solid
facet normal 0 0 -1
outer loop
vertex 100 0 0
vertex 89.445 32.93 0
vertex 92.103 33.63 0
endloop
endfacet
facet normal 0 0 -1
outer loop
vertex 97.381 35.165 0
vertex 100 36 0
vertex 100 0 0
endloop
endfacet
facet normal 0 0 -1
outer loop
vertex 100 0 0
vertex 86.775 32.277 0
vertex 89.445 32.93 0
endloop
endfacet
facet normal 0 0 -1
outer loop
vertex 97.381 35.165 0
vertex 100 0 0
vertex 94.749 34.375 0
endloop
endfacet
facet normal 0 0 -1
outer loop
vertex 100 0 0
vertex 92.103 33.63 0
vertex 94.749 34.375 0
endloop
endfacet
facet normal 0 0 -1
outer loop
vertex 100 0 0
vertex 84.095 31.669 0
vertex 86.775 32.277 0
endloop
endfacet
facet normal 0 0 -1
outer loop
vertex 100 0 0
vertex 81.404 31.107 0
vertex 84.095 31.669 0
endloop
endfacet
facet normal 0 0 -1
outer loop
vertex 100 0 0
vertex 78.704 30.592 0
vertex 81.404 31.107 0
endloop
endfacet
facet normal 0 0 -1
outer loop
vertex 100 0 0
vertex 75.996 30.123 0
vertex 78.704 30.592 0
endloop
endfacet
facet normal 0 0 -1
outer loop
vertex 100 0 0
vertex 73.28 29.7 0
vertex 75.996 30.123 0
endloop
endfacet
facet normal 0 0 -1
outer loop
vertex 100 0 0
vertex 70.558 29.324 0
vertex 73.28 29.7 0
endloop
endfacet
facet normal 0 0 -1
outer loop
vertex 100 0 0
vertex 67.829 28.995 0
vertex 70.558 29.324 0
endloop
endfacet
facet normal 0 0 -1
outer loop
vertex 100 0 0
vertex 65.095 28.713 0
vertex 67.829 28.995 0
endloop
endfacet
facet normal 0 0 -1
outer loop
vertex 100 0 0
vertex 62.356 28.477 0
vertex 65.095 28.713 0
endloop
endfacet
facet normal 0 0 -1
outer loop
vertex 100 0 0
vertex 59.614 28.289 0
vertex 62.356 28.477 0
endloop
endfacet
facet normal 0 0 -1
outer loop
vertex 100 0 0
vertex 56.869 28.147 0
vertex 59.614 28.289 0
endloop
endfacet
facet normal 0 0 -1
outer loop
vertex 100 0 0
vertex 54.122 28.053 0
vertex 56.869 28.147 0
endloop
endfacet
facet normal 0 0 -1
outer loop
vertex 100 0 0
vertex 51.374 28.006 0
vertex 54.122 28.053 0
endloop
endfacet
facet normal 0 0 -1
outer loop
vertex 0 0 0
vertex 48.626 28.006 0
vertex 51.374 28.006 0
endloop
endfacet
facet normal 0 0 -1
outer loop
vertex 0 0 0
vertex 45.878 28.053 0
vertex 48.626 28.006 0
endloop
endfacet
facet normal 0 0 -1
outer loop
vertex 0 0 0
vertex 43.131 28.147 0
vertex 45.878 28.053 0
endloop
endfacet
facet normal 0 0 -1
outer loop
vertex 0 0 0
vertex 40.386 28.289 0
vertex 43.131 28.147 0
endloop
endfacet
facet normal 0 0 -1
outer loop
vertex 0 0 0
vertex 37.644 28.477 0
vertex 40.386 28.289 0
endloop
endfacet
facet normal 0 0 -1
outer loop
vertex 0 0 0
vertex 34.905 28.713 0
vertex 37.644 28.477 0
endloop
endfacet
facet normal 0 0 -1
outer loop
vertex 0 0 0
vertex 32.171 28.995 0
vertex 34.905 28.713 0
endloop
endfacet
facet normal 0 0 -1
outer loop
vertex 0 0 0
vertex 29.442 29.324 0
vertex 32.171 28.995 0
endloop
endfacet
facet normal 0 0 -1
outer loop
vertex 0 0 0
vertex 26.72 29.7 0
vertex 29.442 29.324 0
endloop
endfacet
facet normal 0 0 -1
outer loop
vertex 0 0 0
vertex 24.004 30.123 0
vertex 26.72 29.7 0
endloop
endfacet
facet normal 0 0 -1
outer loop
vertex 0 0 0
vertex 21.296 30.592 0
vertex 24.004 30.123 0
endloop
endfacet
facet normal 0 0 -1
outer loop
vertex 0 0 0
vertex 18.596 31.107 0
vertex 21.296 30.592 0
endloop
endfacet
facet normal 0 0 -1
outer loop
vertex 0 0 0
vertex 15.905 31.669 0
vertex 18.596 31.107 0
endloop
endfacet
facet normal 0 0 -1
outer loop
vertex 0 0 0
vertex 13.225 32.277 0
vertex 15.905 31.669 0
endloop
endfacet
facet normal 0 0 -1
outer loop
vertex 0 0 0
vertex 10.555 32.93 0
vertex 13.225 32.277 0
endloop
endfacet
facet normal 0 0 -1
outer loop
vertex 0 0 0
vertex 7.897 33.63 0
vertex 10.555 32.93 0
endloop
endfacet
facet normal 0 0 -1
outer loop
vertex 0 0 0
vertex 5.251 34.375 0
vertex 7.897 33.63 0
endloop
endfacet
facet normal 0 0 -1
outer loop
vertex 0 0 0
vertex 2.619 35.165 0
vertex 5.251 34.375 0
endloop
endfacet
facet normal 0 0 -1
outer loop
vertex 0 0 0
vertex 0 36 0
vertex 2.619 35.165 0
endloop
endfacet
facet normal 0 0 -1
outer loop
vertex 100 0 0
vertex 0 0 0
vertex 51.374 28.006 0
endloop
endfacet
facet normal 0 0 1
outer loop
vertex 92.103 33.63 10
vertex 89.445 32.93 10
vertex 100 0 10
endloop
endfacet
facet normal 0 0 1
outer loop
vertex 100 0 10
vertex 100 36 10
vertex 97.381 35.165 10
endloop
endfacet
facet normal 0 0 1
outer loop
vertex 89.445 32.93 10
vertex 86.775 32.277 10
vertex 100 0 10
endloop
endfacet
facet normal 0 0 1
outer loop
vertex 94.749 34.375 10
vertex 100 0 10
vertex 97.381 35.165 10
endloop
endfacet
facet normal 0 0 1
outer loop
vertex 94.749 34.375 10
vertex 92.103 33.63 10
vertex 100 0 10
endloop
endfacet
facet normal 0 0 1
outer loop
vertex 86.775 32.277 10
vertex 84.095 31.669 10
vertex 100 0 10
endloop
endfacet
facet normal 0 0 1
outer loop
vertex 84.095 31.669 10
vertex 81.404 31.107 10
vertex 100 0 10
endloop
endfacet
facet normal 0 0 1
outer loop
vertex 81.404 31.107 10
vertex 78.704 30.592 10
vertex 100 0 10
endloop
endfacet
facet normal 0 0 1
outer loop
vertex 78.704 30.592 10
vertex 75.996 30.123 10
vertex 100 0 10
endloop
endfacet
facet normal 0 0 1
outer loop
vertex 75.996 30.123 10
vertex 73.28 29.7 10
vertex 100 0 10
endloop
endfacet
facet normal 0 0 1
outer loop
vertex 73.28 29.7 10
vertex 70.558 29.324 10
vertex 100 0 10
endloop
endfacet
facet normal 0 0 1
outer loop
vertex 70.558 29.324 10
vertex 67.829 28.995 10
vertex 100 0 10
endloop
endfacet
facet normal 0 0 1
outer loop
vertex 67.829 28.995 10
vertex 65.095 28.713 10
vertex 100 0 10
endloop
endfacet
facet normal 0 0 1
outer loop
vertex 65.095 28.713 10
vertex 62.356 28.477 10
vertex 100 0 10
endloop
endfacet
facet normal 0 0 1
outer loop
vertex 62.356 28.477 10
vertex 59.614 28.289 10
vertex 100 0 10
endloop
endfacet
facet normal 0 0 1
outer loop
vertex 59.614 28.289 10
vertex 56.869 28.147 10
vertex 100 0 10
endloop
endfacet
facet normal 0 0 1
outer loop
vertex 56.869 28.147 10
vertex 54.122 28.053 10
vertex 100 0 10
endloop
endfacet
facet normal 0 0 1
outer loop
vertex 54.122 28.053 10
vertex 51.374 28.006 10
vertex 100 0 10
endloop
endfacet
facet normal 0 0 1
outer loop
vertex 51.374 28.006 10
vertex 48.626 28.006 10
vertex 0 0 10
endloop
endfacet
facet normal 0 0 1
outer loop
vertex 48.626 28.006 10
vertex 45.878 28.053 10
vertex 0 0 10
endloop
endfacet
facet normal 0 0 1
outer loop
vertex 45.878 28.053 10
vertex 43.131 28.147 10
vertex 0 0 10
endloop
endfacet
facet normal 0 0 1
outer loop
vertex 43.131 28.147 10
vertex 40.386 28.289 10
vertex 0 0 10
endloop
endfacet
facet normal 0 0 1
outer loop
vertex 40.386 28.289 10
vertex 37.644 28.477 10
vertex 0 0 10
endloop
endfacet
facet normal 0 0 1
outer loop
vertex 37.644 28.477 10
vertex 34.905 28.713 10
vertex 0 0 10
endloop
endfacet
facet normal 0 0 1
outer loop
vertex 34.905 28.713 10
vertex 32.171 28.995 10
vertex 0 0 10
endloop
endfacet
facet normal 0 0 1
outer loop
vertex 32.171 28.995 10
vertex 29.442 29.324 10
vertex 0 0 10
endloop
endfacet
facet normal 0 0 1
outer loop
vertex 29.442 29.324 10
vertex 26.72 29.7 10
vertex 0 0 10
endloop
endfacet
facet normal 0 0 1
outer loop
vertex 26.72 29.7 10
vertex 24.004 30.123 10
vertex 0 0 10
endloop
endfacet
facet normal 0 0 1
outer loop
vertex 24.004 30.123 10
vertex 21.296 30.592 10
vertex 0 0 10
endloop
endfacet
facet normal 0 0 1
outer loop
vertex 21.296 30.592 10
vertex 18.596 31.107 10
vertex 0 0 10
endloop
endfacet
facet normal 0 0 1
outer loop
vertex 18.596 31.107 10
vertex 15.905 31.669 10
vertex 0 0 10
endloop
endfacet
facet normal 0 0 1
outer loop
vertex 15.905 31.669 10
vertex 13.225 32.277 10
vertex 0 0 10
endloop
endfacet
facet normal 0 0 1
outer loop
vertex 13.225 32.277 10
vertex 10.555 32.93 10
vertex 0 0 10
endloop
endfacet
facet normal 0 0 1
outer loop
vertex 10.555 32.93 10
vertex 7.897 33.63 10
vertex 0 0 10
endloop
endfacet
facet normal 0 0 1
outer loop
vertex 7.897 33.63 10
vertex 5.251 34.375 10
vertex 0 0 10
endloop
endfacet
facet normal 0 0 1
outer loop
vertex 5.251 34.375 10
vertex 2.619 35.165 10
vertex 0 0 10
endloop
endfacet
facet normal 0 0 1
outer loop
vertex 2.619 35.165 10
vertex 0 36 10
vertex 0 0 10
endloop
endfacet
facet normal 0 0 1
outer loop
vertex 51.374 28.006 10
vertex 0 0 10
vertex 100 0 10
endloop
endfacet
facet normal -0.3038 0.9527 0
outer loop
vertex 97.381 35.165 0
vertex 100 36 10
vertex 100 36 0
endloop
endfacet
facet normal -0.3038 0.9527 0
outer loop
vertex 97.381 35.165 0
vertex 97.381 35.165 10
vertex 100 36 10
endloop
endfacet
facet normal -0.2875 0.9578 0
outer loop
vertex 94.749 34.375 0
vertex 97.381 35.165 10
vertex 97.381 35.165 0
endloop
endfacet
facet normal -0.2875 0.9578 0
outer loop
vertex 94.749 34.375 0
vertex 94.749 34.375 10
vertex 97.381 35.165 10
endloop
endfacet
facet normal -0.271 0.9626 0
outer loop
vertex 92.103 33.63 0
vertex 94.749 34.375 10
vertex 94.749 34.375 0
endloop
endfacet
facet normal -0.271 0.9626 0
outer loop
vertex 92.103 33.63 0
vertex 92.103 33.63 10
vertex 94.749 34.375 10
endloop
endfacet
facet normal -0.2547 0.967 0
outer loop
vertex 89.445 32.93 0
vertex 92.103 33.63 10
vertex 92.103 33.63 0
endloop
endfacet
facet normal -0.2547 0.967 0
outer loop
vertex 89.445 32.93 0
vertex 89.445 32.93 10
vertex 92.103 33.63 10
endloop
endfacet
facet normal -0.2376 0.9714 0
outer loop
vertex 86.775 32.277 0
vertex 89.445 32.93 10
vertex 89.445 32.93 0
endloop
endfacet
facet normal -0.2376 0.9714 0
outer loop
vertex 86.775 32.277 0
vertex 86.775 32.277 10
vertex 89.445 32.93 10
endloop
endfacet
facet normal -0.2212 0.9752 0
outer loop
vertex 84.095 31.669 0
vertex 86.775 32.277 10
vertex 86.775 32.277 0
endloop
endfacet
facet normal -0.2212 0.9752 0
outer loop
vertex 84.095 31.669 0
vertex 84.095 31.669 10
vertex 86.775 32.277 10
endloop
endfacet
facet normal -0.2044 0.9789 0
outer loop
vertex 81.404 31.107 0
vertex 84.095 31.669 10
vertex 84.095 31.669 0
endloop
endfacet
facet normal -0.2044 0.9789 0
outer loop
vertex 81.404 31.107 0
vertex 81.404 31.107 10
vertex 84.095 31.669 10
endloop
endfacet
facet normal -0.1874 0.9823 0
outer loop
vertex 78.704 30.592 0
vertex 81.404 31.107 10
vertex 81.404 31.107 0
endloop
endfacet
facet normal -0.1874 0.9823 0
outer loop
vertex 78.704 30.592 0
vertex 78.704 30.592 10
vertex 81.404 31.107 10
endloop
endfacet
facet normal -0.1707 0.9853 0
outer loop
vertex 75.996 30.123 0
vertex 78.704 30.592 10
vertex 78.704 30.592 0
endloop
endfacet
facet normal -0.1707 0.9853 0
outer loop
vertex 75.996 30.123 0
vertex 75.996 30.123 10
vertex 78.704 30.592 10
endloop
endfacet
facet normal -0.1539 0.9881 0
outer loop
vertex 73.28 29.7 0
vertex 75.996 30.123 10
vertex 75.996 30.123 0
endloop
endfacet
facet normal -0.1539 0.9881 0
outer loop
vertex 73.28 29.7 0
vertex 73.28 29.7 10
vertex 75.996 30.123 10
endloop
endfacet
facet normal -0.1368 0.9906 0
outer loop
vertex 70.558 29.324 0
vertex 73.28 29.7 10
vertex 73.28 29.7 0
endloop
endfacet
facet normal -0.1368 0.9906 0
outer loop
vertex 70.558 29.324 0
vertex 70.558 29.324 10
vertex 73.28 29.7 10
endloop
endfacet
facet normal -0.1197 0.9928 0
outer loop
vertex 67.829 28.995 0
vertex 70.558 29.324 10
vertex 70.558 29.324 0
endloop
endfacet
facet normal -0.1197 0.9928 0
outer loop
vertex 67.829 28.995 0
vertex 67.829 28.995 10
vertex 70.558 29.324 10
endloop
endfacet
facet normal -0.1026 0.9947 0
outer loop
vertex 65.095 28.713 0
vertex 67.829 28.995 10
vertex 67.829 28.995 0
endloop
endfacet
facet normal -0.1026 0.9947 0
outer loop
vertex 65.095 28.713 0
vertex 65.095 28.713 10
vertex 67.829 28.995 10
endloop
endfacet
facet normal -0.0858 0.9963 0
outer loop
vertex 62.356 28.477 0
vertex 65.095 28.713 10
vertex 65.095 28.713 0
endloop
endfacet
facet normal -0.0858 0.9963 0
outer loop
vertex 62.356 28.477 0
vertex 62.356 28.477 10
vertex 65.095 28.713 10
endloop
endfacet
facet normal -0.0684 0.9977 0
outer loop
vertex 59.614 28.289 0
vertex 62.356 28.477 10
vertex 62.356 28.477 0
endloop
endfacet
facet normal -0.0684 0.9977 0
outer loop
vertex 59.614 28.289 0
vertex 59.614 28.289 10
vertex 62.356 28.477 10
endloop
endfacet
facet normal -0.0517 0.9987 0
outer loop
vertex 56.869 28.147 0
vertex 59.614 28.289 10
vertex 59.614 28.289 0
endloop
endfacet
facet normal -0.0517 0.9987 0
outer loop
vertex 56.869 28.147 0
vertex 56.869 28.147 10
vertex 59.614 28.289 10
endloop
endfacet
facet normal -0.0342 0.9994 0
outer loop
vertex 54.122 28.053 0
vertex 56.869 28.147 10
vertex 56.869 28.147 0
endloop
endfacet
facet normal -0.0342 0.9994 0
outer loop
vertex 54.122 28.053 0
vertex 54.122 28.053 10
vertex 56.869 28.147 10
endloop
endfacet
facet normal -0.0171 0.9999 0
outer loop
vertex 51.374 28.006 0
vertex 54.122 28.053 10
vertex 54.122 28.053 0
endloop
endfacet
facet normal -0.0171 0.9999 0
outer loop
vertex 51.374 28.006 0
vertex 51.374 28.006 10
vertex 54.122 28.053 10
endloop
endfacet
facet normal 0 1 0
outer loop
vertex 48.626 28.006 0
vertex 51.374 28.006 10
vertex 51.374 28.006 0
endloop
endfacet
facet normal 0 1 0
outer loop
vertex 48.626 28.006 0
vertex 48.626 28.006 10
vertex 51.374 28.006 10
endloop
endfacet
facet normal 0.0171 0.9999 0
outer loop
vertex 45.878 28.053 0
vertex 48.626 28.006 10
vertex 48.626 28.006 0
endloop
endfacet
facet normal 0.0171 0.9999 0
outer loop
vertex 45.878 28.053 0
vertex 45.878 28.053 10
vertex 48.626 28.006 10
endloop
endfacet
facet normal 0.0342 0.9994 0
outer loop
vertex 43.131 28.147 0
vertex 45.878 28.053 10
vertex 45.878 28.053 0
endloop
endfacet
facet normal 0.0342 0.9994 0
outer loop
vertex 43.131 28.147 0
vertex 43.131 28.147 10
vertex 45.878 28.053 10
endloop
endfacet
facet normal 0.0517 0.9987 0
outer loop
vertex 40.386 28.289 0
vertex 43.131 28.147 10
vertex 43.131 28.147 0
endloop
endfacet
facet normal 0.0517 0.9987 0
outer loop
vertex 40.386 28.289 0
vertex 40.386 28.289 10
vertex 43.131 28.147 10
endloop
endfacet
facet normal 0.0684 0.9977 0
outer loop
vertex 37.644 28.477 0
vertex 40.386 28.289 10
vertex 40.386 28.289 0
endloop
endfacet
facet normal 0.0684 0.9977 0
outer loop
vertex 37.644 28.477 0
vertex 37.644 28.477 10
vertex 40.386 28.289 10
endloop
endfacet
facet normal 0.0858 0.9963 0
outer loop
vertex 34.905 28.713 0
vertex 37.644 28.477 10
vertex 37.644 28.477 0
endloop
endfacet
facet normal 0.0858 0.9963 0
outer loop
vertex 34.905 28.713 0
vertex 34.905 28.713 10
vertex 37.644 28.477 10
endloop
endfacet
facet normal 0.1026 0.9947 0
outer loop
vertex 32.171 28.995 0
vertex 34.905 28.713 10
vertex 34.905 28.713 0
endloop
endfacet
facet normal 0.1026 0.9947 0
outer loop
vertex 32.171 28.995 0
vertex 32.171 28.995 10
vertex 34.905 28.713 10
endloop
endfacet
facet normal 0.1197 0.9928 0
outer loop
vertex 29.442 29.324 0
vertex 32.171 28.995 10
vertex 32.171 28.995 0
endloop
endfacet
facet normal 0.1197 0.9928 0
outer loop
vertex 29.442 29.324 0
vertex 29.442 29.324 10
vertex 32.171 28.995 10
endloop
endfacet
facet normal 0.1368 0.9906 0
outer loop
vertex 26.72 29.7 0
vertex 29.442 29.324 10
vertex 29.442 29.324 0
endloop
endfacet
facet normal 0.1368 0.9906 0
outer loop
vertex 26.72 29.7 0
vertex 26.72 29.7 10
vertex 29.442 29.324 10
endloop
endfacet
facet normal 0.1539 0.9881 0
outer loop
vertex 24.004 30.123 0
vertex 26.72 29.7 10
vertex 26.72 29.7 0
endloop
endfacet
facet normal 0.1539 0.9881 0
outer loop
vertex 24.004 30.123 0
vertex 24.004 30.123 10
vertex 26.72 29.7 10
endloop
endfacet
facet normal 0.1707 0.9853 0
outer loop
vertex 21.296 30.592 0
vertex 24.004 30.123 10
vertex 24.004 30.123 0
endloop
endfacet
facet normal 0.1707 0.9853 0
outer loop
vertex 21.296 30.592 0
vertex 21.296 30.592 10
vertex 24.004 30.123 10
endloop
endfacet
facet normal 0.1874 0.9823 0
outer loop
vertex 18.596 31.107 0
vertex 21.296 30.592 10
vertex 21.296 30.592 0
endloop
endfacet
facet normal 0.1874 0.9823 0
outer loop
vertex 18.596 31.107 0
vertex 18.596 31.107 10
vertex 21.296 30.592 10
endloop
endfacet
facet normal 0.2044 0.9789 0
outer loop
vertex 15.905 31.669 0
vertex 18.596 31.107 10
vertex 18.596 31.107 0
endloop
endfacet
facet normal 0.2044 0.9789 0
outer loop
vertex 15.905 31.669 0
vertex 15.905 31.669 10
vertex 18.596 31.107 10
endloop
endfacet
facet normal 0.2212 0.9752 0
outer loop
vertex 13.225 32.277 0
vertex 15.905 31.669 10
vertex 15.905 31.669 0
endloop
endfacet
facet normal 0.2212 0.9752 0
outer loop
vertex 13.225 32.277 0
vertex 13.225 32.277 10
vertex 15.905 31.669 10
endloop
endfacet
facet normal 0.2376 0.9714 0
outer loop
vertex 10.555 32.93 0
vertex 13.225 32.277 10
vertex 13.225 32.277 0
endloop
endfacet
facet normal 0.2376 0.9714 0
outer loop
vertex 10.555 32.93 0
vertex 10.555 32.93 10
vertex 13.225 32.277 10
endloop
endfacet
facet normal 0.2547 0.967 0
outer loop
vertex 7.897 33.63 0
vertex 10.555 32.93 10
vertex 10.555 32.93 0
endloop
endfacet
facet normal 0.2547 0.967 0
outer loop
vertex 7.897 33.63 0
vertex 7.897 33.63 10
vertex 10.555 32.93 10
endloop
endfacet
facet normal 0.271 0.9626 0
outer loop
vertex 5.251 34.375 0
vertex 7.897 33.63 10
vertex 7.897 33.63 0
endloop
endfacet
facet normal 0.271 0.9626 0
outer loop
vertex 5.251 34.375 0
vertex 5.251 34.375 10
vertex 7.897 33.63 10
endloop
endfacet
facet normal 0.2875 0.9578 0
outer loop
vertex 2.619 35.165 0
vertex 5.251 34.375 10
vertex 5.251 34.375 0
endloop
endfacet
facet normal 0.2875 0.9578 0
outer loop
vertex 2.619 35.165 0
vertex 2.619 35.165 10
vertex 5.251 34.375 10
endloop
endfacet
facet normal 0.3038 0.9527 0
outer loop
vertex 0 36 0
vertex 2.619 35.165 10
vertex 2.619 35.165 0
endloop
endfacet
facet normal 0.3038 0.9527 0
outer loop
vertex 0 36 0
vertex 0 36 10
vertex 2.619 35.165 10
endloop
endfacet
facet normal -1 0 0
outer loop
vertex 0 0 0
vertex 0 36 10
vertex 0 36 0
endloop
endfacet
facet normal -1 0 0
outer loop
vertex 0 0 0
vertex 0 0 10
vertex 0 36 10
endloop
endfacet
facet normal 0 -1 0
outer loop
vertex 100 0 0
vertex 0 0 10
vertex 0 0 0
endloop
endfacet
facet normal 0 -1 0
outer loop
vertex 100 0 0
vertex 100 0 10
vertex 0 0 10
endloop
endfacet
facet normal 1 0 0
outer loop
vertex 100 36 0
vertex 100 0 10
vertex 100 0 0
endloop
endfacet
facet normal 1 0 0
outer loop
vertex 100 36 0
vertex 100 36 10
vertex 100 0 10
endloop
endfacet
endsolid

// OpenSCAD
$fn = 32;

// ----------------------------------------------------------------------
// Arc profile plate: notch, 40 points
// ----------------------------------------------------------------------

// --- parameters (mm) ---
bar_l = 100;              // bar length, X
bar_w = 36;               // bar width, Y
notch_depth = 8;          // depth of the arc notch at mid-span
arc_r = 160.25;           // radius of the notch arc
arc_angle = 36.36;        // notch arc angle, degrees
arc_step = 1;             // sampling step of the notch arc, degrees
plate_t = 10;             // plate thickness, Z
fit_tol = 0.1;            // declared fit tolerance (prompt contract)
free_tol = 0.3;           // declared free tolerance (prompt contract)

profile = [[0, 0], [100, 0], [100, 36], [97.381, 35.165], [94.749, 34.375], [92.103, 33.63], [89.445, 32.93], [86.775, 32.277], [84.095, 31.669], [81.404, 31.107], [78.704, 30.592], [75.996, 30.123], [73.28, 29.7], [70.558, 29.324], [67.829, 28.995], [65.095, 28.713], [62.356, 28.477], [59.614, 28.289], [56.869, 28.147], [54.122, 28.053], [51.374, 28.006], [48.626, 28.006], [45.878, 28.053], [43.131, 28.147], [40.386, 28.289], [37.644, 28.477], [34.905, 28.713], [32.171, 28.995], [29.442, 29.324], [26.72, 29.7], [24.004, 30.123], [21.296, 30.592], [18.596, 31.107], [15.905, 31.669], [13.225, 32.277], [10.555, 32.93], [7.897, 33.63], [5.251, 34.375], [2.619, 35.165], [0, 36]];  // primary outline, 40 points, counter clockwise

// --- the one profile operation ---
linear_extrude(height = plate_t) polygon(points = profile);
